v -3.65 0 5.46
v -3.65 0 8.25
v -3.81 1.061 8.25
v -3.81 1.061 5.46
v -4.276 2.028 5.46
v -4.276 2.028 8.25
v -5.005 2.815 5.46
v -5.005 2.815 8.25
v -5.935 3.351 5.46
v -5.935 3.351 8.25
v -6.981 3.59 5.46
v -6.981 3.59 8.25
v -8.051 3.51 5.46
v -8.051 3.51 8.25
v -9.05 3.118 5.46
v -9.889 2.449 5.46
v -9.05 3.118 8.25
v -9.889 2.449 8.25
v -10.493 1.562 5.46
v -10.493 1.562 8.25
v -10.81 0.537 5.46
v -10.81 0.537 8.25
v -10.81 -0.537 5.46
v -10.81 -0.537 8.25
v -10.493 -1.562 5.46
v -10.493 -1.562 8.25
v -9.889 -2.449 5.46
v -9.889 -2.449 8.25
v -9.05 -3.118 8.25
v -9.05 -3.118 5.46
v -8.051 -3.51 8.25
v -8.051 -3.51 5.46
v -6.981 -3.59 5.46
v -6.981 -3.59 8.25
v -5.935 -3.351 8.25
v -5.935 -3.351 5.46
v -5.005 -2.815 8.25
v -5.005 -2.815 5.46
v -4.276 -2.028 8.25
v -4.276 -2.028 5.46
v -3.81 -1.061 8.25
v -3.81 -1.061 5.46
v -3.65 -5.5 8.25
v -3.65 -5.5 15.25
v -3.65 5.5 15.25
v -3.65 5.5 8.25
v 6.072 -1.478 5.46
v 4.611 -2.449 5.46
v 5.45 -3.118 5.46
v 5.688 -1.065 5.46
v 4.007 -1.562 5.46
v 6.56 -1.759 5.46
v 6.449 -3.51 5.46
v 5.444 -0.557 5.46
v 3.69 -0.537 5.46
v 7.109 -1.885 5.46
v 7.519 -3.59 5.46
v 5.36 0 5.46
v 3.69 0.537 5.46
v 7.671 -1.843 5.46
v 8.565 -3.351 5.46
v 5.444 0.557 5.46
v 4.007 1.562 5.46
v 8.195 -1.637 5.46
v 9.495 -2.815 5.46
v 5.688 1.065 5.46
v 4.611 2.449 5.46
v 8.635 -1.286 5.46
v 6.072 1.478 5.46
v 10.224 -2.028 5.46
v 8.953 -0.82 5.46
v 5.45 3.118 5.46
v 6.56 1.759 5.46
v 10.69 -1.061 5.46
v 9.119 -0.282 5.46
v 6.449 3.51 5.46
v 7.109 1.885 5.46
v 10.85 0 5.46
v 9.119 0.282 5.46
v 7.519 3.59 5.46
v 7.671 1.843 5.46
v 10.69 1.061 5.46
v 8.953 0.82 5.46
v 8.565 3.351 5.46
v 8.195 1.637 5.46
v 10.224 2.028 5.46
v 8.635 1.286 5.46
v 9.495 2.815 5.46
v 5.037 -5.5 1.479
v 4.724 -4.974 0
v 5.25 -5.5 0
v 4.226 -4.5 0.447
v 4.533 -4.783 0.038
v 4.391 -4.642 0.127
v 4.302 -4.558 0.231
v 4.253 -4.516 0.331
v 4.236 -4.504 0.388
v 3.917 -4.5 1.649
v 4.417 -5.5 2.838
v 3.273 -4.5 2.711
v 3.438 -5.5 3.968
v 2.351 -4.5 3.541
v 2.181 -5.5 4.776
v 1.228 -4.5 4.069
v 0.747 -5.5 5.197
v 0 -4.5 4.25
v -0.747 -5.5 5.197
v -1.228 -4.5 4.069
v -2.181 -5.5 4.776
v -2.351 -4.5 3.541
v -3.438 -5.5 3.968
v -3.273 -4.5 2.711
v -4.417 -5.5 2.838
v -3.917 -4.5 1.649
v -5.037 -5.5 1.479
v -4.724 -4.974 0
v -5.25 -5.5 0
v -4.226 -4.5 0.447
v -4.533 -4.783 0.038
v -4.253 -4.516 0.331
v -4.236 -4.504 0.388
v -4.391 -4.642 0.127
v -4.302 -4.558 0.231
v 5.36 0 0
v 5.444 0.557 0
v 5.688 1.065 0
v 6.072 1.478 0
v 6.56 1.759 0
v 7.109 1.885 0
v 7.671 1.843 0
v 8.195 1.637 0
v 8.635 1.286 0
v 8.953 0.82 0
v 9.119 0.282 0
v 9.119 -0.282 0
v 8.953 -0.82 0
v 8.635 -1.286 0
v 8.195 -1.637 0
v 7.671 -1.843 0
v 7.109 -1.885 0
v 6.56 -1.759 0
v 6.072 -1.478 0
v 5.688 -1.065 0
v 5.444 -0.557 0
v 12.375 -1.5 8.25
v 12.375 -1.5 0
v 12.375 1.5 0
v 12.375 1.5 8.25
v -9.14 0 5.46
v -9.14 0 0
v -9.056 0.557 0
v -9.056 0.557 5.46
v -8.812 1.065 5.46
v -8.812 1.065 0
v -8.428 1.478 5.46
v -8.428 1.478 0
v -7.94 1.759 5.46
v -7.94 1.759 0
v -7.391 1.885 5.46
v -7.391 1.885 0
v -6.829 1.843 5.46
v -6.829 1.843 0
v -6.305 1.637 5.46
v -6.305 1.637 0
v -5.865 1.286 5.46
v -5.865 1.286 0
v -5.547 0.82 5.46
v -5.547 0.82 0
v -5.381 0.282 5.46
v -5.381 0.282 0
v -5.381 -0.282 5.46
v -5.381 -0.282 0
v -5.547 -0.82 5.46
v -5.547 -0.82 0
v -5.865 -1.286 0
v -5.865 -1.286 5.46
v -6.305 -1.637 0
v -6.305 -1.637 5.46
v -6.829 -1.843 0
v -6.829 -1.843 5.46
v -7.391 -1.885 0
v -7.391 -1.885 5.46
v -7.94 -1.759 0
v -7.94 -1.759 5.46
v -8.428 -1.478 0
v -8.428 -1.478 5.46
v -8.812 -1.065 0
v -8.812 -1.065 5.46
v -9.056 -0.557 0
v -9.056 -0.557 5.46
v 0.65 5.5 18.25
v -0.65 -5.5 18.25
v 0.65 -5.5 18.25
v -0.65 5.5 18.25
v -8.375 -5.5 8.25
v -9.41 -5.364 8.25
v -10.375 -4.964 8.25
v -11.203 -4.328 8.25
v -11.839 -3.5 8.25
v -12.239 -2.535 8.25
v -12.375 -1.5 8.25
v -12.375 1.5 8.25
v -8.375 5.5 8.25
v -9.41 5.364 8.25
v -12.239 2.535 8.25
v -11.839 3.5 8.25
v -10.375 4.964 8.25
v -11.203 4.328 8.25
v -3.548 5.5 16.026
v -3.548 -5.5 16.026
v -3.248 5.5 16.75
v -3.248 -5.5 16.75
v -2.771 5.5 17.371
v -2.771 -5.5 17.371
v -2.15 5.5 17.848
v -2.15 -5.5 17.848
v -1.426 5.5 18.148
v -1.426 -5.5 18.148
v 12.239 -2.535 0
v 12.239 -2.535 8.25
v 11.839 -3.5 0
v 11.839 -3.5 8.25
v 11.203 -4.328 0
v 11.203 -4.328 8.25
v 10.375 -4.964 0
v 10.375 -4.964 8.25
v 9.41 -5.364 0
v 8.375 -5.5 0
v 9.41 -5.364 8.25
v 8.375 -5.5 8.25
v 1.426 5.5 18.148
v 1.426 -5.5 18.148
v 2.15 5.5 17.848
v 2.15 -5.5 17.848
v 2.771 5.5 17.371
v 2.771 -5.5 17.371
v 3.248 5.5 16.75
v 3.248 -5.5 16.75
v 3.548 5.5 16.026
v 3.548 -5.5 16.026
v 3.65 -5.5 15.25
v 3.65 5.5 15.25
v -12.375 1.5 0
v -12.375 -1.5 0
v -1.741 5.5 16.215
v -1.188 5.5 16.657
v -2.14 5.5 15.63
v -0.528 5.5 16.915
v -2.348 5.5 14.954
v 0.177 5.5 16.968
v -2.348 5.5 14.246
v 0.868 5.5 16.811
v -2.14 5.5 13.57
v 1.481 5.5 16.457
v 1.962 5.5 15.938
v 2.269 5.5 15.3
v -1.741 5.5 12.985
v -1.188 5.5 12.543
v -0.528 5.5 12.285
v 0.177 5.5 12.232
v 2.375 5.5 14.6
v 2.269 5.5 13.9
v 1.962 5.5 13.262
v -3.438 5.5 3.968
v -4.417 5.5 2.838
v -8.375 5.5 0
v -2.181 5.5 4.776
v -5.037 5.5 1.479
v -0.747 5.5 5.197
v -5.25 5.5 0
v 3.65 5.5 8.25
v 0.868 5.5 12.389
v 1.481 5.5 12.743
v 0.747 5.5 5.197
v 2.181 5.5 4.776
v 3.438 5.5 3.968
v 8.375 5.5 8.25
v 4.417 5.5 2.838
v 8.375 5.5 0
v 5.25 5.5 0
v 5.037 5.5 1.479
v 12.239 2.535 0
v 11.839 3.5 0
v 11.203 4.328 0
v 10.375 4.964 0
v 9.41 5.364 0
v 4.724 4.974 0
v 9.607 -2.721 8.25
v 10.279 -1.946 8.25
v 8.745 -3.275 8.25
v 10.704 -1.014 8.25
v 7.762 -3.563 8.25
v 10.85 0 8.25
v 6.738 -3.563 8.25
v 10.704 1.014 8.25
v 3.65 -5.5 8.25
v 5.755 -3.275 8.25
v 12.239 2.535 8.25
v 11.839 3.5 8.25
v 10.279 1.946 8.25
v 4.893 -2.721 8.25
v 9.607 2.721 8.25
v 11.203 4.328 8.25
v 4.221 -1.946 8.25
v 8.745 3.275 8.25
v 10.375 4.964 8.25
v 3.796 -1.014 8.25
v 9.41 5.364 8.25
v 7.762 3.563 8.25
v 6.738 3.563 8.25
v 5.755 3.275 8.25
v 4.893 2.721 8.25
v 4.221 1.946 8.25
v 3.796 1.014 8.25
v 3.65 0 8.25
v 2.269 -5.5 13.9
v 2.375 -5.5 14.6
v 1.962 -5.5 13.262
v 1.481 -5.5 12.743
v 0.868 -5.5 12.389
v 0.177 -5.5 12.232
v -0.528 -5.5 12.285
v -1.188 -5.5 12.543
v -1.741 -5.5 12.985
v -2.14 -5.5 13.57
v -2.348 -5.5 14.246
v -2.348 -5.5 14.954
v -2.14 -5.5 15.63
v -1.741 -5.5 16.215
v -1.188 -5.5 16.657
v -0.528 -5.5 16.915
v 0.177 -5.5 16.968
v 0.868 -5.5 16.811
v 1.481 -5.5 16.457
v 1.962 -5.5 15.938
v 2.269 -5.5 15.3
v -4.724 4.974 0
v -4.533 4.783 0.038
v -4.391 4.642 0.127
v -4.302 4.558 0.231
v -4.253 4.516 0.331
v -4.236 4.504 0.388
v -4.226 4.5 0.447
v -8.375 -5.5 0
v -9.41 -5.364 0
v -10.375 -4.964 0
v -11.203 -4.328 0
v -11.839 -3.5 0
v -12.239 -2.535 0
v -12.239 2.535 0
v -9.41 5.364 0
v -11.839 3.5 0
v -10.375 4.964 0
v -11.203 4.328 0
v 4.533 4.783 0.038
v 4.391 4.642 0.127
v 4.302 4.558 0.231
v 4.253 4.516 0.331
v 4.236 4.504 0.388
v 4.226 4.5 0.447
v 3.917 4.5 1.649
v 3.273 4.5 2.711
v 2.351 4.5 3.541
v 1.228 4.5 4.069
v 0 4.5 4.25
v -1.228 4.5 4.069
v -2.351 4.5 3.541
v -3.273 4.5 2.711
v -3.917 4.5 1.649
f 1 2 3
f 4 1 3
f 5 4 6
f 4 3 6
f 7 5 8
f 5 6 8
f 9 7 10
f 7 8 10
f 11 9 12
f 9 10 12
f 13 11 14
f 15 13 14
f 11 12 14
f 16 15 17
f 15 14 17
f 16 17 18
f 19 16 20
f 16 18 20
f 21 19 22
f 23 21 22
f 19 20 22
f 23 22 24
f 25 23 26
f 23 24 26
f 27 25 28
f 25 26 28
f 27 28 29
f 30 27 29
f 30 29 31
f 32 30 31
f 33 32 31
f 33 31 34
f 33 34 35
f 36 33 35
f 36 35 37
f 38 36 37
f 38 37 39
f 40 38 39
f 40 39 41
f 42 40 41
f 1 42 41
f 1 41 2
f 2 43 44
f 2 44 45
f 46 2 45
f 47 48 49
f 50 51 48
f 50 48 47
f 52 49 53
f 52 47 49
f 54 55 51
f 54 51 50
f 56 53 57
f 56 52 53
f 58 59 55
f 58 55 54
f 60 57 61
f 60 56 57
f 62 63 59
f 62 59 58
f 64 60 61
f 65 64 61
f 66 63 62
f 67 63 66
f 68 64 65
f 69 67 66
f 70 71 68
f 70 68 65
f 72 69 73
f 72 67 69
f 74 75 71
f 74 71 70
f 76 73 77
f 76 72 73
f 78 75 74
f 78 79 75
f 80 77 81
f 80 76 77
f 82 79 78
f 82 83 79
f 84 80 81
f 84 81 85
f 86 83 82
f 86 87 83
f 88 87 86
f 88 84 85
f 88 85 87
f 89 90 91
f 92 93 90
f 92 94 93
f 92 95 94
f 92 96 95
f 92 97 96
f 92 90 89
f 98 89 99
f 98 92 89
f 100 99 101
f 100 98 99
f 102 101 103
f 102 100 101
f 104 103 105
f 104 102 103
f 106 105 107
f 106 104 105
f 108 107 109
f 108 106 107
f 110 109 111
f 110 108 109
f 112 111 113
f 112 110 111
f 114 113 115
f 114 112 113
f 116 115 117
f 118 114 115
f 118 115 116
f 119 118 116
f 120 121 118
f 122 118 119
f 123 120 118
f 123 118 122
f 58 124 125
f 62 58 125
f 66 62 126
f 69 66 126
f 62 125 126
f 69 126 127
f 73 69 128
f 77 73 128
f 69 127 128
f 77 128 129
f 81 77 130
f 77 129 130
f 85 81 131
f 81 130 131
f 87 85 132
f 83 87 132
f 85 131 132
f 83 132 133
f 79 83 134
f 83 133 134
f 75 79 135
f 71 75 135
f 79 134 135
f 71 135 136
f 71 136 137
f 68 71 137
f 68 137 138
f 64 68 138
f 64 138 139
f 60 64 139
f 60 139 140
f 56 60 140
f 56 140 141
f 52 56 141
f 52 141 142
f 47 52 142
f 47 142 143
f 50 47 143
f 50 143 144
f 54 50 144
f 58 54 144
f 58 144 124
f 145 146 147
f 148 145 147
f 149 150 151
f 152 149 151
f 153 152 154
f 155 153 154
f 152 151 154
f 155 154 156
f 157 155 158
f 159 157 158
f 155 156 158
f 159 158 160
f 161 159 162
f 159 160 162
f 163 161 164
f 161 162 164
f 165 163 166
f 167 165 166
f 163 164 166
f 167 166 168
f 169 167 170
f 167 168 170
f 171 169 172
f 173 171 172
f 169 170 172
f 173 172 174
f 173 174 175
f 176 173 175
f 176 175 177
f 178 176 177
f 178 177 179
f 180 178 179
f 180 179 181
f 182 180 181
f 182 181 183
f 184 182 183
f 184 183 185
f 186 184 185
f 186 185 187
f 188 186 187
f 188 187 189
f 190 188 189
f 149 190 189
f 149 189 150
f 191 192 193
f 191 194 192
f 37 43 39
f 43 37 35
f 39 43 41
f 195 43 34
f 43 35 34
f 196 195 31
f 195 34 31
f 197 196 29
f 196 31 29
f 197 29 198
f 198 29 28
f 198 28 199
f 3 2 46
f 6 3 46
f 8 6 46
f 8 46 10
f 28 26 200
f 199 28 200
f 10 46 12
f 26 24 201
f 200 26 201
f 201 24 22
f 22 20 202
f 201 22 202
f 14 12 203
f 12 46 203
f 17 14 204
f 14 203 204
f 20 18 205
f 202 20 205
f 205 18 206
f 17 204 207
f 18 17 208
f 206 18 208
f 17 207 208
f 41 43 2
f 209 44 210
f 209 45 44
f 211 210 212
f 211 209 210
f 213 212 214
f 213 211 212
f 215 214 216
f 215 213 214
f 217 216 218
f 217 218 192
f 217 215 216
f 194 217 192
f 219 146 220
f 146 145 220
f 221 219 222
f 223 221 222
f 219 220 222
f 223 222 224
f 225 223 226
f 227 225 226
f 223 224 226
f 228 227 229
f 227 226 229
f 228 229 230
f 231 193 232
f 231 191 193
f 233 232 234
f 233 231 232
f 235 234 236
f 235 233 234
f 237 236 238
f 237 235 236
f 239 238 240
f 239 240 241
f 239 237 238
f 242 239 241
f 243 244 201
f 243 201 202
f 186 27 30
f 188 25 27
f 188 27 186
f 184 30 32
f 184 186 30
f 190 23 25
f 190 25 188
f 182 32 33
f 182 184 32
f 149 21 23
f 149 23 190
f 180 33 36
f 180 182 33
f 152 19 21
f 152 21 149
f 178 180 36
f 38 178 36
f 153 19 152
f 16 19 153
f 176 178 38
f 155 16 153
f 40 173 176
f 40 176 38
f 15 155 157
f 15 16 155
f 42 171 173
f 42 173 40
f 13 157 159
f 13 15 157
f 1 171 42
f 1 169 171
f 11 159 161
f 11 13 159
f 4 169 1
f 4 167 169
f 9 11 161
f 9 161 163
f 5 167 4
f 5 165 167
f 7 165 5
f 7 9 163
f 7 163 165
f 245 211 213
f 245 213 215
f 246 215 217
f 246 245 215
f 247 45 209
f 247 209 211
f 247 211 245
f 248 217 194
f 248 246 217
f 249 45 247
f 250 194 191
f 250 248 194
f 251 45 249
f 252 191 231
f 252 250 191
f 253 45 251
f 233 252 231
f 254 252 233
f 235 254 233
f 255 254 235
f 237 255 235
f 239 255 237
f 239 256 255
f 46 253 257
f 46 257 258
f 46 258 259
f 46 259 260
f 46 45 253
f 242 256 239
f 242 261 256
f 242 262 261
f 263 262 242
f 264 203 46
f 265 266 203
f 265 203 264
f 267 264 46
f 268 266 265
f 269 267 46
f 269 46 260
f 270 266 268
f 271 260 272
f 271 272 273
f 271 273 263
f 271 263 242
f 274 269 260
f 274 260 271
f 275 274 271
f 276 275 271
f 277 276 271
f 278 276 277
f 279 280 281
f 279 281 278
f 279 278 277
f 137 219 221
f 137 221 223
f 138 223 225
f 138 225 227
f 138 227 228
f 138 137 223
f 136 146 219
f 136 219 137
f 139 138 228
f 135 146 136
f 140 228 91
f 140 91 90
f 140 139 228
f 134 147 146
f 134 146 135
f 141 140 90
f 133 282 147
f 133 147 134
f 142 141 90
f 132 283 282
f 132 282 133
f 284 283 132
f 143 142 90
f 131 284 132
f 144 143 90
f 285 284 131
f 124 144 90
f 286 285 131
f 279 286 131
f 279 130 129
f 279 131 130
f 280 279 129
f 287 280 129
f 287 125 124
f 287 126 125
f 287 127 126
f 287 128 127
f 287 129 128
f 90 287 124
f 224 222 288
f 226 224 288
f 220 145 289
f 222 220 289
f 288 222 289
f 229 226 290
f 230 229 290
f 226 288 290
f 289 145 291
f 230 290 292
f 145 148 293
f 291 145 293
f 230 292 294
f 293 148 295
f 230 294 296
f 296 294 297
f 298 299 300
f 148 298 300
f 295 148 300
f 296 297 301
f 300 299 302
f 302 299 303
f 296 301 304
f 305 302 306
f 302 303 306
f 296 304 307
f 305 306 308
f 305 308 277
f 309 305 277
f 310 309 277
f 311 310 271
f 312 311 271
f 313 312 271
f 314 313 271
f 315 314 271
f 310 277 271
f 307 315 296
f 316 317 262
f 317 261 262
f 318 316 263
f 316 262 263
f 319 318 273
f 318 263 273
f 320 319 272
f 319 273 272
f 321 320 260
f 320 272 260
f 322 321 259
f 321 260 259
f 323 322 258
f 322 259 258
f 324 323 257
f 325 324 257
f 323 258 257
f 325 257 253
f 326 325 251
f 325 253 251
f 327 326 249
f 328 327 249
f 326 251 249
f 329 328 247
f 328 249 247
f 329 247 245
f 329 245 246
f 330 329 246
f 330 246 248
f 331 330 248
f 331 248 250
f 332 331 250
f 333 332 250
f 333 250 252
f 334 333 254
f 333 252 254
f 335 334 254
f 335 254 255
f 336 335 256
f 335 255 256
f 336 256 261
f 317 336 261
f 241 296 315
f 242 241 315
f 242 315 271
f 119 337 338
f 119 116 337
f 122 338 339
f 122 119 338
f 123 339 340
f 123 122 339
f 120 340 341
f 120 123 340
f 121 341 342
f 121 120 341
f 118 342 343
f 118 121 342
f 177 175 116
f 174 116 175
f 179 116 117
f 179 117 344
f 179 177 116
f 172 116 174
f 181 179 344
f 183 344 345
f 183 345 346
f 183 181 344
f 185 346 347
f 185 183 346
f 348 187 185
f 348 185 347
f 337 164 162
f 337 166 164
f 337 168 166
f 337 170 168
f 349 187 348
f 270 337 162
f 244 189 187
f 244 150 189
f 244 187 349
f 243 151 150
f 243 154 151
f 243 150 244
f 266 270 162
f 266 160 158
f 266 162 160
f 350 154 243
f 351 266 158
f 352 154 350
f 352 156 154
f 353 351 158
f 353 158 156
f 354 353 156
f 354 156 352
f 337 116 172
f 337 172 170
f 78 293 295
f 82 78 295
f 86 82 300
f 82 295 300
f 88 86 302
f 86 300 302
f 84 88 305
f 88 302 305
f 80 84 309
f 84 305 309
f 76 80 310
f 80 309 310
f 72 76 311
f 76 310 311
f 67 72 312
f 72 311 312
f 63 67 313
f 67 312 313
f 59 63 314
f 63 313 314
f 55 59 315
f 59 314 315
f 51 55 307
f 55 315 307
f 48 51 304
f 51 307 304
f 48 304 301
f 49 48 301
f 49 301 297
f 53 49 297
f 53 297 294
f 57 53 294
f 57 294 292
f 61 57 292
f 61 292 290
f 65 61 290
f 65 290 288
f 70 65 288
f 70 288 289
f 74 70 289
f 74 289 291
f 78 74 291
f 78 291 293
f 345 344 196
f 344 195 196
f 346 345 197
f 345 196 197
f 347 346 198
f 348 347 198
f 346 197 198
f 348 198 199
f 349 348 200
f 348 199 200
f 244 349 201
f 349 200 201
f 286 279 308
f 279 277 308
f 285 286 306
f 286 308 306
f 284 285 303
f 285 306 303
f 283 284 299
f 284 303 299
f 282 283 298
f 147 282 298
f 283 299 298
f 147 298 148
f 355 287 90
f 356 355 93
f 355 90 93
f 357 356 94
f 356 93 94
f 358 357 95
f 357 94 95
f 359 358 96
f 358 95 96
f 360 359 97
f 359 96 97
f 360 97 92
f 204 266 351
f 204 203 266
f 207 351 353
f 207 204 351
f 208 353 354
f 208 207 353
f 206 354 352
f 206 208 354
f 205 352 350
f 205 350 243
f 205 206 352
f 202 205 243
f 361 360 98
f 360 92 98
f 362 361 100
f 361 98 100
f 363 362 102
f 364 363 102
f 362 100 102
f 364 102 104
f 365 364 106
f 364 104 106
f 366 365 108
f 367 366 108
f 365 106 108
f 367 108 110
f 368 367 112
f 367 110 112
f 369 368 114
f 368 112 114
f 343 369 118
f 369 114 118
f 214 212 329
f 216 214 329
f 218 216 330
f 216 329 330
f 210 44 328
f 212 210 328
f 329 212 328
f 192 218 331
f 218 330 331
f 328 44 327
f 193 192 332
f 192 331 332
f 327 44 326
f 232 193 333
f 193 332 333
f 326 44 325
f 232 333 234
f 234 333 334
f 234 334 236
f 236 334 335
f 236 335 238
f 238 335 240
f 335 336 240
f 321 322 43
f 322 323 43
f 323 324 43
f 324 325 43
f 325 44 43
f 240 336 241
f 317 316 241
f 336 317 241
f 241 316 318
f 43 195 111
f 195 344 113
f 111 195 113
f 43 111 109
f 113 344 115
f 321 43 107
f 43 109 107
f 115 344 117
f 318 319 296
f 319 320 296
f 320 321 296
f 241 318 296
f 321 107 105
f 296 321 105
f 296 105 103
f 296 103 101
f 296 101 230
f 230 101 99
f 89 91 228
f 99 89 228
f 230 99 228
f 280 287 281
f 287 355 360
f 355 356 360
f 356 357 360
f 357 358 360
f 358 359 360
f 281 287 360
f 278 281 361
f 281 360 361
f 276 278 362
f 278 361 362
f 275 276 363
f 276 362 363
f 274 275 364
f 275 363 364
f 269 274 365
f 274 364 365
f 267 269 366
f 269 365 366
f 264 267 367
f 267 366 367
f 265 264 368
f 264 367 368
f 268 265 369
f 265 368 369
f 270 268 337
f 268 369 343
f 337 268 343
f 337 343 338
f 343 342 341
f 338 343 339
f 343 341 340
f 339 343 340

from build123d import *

# Parameters (mm, degrees)
CROQUIS1_W                                           = 24.75
CROQUIS1_H                                           = 11
SALIENTE_EXTRUIR1_DEPTH                              = 8.25
REFRENTADO_PARA_TORNILLO_CON_CABEZA_HEXA_D           = 3.78
REFRENTADO_PARA_TORNILLO_CON_CABEZA_HEXA_DEPTH       = 8.25
REFRENTADO_PARA_TORNILLO_CON_CABEZA_HEXA_CBORE_D     = 7.2
REFRENTADO_PARA_TORNILLO_CON_CABEZA_HEXA_CBORE_DEPTH = 2.79
DI_METRO_DE_TALADRO_8_5_8_5_1_D                      = 8.5
DI_METRO_DE_TALADRO_8_5_8_5_1_DEPTH                  = 11
CHAFL_N1_SIZE                                        = 1
REDONDEO1_R                                          = 0.5
REDONDEO2_R                                          = 4
CROQUIS6_W                                           = 7.3
CROQUIS6_H                                           = 11
SALIENTE_EXTRUIR3_DEPTH                              = 10
CROQUIS7_R                                           = 2.375
CORTAR_EXTRUIR1_DEPTH                                = 6.5000001
CORTAR_EXTRUIR1_DEPTH_BACK                           = 6.5000001
REDONDEO3_R                                          = 3


with BuildPart() as part:
    # Croquis1 → Saliente-Extruir1 (new body)
    with BuildSketch(Plane(origin=(0, 0, 0), x_dir=(-1, 0, 0), z_dir=(0, 0, -1))):
        Rectangle(CROQUIS1_W, CROQUIS1_H)
    extrude(amount=-SALIENTE_EXTRUIR1_DEPTH)

    # Refrentado para tornillo con cabeza hexagonal de M3.51
    with Locations(Plane.XY.offset(8.25)):
        with Locations((-7.25, 0), (7.25, 0)):
            CounterBoreHole(REFRENTADO_PARA_TORNILLO_CON_CABEZA_HEXA_D / 2, REFRENTADO_PARA_TORNILLO_CON_CABEZA_HEXA_CBORE_D / 2, REFRENTADO_PARA_TORNILLO_CON_CABEZA_HEXA_CBORE_DEPTH, depth=REFRENTADO_PARA_TORNILLO_CON_CABEZA_HEXA_DEPTH)

    # Diámetro de taladro Ø8.5 (8.5)1
    with Locations(Plane(origin=(0, 5.5, 0), x_dir=(1, 0, 0), z_dir=(0, 1, 0))):
        with Locations((0, 0)):
            Hole(DI_METRO_DE_TALADRO_8_5_8_5_1_D / 2, depth=DI_METRO_DE_TALADRO_8_5_8_5_1_DEPTH)

    # Chaflán1
    chafl_n1_edges = [part.edges().sort_by_distance(p)[0] for p in [
        (0, 5.5, 4.25),
        (0, -5.5, 4.25),
    ]]
    chamfer(chafl_n1_edges, length=CHAFL_N1_SIZE)

    # Redondeo1
    redondeo1_edges = [part.edges().sort_by_distance(p)[0] for p in [
        (4.25, 0, 0),
        (-4.25, 0, 0),
    ]]
    fillet(redondeo1_edges, radius=REDONDEO1_R)

    # Redondeo2
    redondeo2_edges = [part.edges().sort_by_distance(p)[0] for p in [
        (-12.375, 5.5, 4.125),
        (-12.375, -5.5, 4.125),
        (12.375, -5.5, 4.125),
        (12.375, 5.5, 4.125),
    ]]
    fillet(redondeo2_edges, radius=REDONDEO2_R)

    # Croquis6 → Saliente-Extruir3 (add)
    with BuildSketch(Plane.XY.offset(8.25)):
        Rectangle(CROQUIS6_W, CROQUIS6_H)
    extrude(amount=SALIENTE_EXTRUIR3_DEPTH)

    # Croquis7 → Cortar-Extruir1 (cut, two sides)
    with BuildSketch(Plane(origin=(0, 0, 0), x_dir=(1, 0, 0), z_dir=(0, 1, 0))) as cortar_extruir1_sk:
        with Locations((0, -14.6)):
            Circle(CROQUIS7_R)
    extrude(amount=CORTAR_EXTRUIR1_DEPTH, mode=Mode.SUBTRACT)
    extrude(cortar_extruir1_sk.sketch, amount=-CORTAR_EXTRUIR1_DEPTH_BACK, mode=Mode.SUBTRACT)

    # Redondeo3
    redondeo3_edges = [part.edges().sort_by_distance(p)[0] for p in [
        (3.65, 0, 18.25),
        (-3.65, 0, 18.25),
    ]]
    fillet(redondeo3_edges, radius=REDONDEO3_R)


solid = part.part
